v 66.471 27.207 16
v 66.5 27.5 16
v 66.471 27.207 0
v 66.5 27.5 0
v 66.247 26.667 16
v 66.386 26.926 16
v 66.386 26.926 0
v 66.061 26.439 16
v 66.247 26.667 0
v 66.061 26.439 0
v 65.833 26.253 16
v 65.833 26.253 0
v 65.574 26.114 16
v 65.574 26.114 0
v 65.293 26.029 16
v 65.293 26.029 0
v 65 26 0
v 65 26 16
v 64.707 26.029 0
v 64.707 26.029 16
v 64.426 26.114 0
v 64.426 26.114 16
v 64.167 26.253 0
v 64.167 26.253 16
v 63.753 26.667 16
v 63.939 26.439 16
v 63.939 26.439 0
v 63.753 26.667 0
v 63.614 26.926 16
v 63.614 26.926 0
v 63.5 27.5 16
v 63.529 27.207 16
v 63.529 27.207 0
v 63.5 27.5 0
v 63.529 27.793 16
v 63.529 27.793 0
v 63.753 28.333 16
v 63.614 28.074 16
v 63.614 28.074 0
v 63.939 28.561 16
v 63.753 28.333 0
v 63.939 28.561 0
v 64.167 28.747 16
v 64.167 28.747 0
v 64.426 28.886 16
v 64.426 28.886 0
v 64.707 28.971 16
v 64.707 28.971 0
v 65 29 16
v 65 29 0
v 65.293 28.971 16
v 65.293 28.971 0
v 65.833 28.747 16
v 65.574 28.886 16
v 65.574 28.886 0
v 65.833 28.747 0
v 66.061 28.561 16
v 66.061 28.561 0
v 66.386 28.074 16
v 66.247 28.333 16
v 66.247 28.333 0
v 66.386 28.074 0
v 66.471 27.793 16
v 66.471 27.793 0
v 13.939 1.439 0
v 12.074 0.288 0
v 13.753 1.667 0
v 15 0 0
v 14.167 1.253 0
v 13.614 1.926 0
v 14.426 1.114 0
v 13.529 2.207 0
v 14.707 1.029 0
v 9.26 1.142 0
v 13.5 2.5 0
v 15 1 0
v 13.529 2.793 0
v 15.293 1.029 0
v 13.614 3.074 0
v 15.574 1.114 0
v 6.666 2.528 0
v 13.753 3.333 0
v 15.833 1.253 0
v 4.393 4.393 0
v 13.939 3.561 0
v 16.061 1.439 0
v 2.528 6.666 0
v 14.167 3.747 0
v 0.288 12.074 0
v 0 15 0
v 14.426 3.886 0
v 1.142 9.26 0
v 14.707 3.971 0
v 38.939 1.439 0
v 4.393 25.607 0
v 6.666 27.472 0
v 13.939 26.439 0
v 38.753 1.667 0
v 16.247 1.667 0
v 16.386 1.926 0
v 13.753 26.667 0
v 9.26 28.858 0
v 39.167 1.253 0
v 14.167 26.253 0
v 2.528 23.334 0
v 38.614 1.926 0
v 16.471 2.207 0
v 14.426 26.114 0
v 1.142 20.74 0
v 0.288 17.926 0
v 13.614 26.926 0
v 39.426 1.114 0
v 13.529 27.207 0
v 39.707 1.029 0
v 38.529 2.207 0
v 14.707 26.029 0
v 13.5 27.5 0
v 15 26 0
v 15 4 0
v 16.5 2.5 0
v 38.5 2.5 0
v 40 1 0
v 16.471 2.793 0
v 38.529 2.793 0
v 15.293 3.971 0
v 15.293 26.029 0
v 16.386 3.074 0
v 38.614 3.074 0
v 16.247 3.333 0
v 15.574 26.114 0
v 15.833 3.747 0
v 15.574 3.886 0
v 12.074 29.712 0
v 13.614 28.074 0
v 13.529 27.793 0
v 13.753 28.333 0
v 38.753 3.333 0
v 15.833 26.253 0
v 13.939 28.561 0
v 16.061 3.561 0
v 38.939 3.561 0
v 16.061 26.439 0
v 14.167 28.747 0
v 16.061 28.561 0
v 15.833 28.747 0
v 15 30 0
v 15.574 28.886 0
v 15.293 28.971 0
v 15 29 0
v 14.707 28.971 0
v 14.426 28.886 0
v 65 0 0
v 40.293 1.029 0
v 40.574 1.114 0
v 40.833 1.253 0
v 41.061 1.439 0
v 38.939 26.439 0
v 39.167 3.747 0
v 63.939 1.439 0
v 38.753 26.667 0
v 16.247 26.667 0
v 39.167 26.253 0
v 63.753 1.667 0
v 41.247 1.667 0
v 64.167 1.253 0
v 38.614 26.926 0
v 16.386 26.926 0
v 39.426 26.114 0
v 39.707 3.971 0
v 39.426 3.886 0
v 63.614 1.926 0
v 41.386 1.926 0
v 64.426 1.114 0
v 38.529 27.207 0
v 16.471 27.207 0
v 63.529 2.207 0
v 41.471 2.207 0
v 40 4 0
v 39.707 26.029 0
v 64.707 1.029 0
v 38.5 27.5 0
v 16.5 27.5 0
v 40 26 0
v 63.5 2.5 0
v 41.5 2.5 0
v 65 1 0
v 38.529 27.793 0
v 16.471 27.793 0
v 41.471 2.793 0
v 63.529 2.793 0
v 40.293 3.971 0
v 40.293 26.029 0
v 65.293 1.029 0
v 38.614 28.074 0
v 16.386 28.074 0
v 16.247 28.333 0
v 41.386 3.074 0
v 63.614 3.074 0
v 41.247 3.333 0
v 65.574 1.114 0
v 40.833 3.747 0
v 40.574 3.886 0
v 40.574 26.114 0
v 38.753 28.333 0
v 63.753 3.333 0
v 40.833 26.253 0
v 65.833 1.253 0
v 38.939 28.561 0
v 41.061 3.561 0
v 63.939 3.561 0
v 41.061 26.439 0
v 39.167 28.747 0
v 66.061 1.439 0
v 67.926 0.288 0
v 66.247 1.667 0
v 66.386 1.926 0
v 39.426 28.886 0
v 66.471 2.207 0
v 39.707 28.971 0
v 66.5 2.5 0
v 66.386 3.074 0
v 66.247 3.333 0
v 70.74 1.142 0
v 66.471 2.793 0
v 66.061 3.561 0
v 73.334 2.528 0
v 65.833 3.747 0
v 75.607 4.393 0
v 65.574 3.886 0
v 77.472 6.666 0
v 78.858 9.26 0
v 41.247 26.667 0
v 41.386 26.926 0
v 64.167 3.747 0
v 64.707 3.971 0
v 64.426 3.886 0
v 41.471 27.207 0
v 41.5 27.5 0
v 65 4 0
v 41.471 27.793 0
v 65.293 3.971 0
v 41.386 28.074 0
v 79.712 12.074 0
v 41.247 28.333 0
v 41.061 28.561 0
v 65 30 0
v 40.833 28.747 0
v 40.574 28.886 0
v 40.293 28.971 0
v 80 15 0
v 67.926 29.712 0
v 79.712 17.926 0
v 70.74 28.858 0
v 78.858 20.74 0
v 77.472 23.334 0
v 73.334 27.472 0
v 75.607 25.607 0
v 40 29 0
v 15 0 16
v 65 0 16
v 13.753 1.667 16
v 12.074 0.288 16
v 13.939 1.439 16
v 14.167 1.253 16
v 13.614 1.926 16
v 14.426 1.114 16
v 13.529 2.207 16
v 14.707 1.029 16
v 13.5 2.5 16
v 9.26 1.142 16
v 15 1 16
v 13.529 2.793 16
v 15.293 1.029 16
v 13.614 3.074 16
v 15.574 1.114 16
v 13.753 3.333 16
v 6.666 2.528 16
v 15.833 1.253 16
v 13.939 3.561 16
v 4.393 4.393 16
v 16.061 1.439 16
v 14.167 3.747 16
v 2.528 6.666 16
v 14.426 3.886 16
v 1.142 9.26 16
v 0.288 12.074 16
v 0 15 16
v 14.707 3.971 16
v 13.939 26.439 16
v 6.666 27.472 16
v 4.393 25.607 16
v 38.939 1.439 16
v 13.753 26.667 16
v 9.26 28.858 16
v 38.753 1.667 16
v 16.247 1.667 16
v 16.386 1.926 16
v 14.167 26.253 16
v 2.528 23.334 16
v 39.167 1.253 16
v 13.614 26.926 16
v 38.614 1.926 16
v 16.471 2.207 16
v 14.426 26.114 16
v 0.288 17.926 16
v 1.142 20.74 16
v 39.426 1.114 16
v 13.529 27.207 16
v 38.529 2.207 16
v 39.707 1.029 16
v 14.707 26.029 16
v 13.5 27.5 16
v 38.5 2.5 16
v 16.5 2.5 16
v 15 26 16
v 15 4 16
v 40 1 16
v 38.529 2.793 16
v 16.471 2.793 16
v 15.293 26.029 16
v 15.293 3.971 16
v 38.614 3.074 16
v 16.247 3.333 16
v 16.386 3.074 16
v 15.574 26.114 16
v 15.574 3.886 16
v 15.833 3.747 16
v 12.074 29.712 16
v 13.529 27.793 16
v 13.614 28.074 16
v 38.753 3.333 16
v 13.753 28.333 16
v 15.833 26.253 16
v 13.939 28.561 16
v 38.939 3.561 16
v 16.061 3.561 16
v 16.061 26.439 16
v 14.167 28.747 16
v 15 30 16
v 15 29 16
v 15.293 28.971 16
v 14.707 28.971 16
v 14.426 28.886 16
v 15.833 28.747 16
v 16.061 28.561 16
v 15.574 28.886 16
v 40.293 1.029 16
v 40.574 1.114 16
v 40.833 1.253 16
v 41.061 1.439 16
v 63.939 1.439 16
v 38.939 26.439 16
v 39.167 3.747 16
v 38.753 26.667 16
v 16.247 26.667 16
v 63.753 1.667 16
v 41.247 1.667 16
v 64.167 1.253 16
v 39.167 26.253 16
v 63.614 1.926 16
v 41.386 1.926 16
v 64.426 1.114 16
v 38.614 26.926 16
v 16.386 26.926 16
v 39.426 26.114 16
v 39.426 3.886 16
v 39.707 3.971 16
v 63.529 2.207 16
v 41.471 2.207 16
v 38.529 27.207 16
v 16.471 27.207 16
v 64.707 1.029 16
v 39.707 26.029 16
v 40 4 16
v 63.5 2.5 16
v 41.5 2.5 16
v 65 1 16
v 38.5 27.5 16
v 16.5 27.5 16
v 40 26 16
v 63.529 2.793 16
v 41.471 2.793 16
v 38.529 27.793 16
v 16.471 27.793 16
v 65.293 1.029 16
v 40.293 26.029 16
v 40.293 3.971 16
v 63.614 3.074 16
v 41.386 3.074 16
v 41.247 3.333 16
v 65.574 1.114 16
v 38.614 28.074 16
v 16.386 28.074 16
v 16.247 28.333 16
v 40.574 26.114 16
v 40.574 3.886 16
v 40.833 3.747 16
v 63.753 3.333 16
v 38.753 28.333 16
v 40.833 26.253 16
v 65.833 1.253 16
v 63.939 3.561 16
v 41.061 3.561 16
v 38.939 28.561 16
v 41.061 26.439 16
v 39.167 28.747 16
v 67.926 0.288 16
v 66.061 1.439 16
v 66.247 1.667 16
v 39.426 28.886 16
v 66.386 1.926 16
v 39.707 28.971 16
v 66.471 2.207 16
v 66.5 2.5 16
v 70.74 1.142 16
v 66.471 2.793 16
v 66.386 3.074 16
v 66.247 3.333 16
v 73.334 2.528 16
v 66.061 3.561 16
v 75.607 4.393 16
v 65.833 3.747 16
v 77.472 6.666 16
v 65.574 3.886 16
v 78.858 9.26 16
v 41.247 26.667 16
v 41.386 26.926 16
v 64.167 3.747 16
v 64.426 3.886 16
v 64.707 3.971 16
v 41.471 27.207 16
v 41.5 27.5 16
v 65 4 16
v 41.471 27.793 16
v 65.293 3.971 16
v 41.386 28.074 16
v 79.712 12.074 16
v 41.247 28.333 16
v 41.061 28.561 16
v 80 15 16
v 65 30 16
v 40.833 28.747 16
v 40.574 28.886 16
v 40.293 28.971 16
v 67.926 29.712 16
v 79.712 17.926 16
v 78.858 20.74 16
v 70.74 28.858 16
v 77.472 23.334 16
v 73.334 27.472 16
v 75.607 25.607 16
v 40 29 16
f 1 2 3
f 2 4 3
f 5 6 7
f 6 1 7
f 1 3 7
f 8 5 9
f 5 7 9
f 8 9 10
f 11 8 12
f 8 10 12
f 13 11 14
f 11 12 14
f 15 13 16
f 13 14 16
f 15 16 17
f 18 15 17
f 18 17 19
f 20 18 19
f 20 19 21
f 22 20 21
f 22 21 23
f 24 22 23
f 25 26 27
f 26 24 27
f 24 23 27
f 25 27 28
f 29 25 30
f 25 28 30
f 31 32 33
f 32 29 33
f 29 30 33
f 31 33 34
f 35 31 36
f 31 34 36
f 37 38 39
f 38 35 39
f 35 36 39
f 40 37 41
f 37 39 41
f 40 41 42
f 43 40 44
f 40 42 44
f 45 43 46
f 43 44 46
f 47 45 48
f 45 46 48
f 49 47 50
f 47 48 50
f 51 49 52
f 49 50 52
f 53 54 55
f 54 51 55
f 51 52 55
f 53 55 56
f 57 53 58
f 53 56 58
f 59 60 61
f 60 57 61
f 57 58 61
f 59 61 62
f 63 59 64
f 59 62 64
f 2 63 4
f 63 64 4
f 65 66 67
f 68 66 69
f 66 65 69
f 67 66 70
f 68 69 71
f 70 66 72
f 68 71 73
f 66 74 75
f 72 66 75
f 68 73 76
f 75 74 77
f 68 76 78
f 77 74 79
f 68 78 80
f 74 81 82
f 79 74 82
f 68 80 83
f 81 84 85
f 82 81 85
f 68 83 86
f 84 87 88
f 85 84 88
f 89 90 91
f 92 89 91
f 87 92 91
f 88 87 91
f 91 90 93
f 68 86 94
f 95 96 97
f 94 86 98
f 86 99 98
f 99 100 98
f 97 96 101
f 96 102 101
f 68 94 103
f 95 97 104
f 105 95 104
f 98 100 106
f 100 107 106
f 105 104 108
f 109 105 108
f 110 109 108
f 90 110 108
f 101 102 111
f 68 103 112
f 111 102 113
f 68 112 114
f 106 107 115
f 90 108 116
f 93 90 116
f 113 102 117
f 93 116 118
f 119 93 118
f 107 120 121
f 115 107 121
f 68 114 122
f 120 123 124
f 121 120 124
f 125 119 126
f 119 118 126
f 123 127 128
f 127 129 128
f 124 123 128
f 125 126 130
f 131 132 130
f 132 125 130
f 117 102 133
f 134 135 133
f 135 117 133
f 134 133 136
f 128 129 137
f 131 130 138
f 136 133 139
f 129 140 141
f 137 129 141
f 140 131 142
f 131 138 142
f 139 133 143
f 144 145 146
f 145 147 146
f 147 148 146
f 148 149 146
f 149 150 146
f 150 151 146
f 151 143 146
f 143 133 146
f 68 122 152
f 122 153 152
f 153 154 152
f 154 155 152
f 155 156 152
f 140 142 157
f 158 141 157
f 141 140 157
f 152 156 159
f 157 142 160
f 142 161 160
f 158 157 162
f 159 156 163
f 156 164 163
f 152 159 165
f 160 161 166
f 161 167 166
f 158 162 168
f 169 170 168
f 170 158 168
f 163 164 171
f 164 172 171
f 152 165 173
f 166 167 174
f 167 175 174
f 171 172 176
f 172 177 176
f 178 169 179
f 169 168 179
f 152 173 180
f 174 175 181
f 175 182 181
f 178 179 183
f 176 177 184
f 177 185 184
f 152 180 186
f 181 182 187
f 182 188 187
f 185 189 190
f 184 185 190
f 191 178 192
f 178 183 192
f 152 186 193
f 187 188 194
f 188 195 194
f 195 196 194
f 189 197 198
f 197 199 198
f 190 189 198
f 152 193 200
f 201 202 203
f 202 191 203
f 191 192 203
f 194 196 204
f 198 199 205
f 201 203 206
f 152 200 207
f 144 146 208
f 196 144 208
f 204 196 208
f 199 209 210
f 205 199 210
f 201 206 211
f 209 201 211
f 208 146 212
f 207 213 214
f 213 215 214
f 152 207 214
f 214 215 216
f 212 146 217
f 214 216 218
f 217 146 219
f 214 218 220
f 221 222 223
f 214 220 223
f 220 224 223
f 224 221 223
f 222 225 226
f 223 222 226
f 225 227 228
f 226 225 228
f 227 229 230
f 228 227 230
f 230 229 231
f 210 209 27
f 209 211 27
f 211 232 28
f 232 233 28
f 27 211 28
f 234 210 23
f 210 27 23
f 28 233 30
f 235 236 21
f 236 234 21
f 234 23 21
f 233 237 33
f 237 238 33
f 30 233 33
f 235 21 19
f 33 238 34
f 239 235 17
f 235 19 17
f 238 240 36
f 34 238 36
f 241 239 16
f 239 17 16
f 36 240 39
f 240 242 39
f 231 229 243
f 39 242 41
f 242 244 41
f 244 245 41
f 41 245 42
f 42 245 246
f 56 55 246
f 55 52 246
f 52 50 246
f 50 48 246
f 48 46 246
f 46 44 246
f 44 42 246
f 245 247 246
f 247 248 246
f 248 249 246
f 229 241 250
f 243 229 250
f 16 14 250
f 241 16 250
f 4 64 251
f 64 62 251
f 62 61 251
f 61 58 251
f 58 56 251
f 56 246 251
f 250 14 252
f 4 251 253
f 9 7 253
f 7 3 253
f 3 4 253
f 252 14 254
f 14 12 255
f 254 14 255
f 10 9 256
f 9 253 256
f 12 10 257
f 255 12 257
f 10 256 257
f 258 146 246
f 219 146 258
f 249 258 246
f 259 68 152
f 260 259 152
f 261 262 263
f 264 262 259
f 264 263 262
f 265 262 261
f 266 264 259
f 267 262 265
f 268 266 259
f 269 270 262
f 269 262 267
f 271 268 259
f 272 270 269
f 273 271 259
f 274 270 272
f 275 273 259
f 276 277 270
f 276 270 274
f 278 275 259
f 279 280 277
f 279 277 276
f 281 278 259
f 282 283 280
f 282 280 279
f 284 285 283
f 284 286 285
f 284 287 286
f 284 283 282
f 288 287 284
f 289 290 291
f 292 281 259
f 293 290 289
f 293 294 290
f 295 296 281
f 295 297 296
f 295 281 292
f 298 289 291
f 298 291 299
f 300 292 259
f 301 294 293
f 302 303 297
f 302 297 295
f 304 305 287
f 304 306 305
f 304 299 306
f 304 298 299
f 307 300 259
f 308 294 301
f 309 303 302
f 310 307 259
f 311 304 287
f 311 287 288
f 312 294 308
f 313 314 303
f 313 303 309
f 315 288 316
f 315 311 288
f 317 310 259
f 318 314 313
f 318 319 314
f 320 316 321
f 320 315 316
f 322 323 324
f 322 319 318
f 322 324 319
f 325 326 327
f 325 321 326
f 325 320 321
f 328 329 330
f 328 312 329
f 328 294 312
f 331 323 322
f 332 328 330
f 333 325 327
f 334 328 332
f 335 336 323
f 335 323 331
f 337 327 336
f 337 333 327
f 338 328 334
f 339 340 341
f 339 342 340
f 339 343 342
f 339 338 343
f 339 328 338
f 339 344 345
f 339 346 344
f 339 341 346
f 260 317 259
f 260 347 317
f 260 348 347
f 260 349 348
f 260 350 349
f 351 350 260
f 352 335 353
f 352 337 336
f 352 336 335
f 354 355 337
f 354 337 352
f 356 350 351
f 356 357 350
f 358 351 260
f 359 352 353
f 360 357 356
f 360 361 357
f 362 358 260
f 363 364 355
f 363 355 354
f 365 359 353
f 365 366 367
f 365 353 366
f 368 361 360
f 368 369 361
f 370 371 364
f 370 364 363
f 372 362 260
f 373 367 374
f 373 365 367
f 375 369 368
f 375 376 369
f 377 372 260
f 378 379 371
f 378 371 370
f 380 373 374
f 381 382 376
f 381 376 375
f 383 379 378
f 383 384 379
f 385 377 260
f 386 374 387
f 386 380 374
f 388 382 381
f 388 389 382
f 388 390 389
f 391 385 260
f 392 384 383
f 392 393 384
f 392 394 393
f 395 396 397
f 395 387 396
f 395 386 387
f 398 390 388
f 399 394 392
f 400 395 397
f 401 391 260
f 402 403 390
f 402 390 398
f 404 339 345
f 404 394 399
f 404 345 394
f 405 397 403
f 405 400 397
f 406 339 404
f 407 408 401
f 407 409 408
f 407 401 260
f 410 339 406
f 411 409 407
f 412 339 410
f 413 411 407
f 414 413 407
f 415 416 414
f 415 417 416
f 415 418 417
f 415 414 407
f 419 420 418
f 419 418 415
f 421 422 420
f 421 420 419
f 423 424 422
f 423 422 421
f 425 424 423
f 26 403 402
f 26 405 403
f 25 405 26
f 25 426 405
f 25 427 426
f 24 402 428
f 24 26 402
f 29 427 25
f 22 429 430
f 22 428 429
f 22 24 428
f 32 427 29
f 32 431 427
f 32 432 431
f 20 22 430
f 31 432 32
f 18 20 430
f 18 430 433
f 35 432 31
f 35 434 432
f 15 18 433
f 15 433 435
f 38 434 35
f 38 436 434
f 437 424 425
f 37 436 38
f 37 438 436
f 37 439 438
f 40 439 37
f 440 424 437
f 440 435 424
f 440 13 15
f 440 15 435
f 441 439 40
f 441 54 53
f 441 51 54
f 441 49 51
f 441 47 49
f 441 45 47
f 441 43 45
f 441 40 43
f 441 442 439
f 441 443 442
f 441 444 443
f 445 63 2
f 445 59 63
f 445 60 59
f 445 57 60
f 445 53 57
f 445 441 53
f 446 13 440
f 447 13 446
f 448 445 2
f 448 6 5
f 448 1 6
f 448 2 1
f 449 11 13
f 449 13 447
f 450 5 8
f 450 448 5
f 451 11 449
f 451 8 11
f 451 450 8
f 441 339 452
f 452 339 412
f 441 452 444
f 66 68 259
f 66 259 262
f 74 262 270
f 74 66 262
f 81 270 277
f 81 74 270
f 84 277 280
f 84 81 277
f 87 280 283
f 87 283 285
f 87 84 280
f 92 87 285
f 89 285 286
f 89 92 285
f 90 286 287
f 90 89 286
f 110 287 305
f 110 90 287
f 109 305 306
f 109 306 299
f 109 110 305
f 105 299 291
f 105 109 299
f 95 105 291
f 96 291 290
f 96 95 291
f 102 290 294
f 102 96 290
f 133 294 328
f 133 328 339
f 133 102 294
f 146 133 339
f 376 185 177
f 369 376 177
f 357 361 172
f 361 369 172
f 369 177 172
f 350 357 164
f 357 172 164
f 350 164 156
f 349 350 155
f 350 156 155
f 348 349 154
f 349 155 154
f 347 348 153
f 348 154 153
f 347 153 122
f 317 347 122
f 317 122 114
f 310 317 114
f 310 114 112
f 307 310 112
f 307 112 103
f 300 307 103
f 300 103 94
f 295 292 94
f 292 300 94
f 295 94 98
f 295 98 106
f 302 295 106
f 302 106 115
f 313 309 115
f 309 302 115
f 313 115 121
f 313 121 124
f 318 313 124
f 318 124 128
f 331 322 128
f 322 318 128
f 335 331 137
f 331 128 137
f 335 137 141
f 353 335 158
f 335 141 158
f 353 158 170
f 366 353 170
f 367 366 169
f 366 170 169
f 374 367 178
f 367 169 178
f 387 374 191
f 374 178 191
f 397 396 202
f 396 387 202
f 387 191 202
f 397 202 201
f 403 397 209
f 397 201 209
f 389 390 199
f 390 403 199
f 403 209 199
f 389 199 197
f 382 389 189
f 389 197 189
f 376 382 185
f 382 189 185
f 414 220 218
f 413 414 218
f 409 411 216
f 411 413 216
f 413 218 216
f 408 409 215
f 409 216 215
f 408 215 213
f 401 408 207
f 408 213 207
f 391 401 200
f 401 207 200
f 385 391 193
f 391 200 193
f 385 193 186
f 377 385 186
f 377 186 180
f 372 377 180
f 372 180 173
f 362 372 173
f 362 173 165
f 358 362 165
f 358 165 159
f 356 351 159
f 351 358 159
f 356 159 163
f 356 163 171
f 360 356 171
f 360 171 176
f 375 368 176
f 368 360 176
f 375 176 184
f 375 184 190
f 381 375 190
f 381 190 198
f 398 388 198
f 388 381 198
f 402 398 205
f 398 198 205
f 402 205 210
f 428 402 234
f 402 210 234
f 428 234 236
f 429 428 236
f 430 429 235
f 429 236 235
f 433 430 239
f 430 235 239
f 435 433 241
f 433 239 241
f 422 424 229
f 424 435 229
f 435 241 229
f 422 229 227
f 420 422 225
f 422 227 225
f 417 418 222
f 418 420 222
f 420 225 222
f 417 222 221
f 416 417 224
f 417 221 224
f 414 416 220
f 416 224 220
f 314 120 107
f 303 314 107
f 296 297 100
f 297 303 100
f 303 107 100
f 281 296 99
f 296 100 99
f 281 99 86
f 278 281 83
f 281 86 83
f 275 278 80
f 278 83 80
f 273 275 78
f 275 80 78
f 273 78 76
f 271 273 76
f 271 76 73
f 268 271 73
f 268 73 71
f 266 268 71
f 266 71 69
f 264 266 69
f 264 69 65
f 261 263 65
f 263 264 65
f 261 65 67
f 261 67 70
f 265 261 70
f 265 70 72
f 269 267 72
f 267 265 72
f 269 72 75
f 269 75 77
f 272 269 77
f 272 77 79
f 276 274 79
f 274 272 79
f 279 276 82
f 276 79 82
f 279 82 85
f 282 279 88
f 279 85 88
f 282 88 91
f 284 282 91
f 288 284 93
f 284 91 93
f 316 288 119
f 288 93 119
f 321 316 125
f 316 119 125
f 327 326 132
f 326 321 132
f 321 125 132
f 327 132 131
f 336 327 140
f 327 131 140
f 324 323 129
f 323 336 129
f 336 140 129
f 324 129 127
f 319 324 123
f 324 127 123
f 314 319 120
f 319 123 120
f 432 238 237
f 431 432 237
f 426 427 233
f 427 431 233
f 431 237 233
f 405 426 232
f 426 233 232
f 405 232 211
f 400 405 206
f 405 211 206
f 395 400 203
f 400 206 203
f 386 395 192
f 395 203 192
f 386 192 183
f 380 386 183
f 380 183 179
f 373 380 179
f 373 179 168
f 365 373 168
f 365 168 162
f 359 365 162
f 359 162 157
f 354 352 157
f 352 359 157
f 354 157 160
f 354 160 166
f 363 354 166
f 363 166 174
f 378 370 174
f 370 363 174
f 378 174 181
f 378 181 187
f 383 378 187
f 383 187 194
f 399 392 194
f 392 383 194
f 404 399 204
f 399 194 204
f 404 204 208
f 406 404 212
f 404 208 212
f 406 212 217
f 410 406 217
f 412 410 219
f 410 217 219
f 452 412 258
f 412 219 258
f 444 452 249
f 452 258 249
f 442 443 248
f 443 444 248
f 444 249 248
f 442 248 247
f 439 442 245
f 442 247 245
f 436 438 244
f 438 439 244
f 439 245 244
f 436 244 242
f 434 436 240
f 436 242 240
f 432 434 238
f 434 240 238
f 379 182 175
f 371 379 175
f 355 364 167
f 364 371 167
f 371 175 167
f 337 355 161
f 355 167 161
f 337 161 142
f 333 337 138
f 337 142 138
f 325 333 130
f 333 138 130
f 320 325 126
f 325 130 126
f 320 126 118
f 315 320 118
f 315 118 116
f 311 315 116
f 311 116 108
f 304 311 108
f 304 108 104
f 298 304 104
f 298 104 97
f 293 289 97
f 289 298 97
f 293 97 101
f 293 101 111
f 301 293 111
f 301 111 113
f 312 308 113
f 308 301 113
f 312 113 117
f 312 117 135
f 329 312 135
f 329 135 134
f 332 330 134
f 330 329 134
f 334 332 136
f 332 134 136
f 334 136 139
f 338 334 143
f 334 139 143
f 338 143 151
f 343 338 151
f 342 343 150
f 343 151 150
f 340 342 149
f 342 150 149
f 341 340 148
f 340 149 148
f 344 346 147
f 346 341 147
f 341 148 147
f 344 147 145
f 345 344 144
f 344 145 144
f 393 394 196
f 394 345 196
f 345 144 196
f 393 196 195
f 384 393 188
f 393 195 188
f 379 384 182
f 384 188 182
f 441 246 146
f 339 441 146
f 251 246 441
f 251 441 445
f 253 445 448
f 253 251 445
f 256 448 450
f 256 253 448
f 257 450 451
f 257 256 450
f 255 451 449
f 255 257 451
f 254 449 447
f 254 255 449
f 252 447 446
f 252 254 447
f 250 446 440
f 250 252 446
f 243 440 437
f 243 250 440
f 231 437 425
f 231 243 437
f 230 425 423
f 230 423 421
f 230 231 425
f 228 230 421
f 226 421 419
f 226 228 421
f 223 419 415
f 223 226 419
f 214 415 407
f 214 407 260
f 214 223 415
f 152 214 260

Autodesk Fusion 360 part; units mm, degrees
sketch "Sketch1" plane through (0, 0, 0) normal (0, 0, 1) x (1, 0, 0)
  line L0 (15, 0) -> (65, 0)
  line L1 (65, 30) -> (15, 30)
  arc A0 (15, 30) -> (0, 15) centre (15, 15) ccw
  arc A1 (0, 15) -> (15, 0) centre (15, 15) ccw
  arc A2 (80, 15) -> (65, 30) centre (65, 15) ccw
  arc A3 (65, 0) -> (80, 15) centre (65, 15) ccw
  line L2 (15, 15) -> (65, 15) construction
  line L3 (15, 15) -> (15, 27.5) construction
  line L4 (65, 15) -> (65, 27.5) construction
  line L5 (15, 27.5) -> (40, 27.5) construction
  circle A4 centre (15, 27.5) radius 1.5
  circle A5 centre (40, 27.5) radius 1.5
  circle A6 centre (65, 27.5) radius 1.5
  circle A7 centre (15, 2.5) radius 1.5
  circle A8 centre (40, 2.5) radius 1.5
  circle A9 centre (65, 2.5) radius 1.5
  point P0 (80, 0)
  point P1 (0, 30)
  dimension "d1" = 80
  dimension "d2" = 30
  dimension "d3" = 15
  dimension "d4" = 15
  dimension "d5" = 15
  dimension "d6" = 15
  dimension "d7" = 12.5
  dimension "d8" = 12.5
  dimension "d9" = 25
  dimension "d11" = 3
  dimension "d12" = 3
  dimension "d13" = 3
extrude "Extrude1" add sketch "Sketch1" along normal blind 16
shell "Shell1" thickness 2 removed faces 1 at (23.6999, 18.8266, 16)
hole "Hole1" at (65, 27.5, 0) at (40, 27.5, 0) at (15, 27.5, 0) at (15, 2.5, 0) at (40, 2.5, 0) at (65, 2.5, 0) direction (0, 0, -1) diameter 4 depth 1 tip angle 180 countersink diameter 4.4 countersink angle 90
